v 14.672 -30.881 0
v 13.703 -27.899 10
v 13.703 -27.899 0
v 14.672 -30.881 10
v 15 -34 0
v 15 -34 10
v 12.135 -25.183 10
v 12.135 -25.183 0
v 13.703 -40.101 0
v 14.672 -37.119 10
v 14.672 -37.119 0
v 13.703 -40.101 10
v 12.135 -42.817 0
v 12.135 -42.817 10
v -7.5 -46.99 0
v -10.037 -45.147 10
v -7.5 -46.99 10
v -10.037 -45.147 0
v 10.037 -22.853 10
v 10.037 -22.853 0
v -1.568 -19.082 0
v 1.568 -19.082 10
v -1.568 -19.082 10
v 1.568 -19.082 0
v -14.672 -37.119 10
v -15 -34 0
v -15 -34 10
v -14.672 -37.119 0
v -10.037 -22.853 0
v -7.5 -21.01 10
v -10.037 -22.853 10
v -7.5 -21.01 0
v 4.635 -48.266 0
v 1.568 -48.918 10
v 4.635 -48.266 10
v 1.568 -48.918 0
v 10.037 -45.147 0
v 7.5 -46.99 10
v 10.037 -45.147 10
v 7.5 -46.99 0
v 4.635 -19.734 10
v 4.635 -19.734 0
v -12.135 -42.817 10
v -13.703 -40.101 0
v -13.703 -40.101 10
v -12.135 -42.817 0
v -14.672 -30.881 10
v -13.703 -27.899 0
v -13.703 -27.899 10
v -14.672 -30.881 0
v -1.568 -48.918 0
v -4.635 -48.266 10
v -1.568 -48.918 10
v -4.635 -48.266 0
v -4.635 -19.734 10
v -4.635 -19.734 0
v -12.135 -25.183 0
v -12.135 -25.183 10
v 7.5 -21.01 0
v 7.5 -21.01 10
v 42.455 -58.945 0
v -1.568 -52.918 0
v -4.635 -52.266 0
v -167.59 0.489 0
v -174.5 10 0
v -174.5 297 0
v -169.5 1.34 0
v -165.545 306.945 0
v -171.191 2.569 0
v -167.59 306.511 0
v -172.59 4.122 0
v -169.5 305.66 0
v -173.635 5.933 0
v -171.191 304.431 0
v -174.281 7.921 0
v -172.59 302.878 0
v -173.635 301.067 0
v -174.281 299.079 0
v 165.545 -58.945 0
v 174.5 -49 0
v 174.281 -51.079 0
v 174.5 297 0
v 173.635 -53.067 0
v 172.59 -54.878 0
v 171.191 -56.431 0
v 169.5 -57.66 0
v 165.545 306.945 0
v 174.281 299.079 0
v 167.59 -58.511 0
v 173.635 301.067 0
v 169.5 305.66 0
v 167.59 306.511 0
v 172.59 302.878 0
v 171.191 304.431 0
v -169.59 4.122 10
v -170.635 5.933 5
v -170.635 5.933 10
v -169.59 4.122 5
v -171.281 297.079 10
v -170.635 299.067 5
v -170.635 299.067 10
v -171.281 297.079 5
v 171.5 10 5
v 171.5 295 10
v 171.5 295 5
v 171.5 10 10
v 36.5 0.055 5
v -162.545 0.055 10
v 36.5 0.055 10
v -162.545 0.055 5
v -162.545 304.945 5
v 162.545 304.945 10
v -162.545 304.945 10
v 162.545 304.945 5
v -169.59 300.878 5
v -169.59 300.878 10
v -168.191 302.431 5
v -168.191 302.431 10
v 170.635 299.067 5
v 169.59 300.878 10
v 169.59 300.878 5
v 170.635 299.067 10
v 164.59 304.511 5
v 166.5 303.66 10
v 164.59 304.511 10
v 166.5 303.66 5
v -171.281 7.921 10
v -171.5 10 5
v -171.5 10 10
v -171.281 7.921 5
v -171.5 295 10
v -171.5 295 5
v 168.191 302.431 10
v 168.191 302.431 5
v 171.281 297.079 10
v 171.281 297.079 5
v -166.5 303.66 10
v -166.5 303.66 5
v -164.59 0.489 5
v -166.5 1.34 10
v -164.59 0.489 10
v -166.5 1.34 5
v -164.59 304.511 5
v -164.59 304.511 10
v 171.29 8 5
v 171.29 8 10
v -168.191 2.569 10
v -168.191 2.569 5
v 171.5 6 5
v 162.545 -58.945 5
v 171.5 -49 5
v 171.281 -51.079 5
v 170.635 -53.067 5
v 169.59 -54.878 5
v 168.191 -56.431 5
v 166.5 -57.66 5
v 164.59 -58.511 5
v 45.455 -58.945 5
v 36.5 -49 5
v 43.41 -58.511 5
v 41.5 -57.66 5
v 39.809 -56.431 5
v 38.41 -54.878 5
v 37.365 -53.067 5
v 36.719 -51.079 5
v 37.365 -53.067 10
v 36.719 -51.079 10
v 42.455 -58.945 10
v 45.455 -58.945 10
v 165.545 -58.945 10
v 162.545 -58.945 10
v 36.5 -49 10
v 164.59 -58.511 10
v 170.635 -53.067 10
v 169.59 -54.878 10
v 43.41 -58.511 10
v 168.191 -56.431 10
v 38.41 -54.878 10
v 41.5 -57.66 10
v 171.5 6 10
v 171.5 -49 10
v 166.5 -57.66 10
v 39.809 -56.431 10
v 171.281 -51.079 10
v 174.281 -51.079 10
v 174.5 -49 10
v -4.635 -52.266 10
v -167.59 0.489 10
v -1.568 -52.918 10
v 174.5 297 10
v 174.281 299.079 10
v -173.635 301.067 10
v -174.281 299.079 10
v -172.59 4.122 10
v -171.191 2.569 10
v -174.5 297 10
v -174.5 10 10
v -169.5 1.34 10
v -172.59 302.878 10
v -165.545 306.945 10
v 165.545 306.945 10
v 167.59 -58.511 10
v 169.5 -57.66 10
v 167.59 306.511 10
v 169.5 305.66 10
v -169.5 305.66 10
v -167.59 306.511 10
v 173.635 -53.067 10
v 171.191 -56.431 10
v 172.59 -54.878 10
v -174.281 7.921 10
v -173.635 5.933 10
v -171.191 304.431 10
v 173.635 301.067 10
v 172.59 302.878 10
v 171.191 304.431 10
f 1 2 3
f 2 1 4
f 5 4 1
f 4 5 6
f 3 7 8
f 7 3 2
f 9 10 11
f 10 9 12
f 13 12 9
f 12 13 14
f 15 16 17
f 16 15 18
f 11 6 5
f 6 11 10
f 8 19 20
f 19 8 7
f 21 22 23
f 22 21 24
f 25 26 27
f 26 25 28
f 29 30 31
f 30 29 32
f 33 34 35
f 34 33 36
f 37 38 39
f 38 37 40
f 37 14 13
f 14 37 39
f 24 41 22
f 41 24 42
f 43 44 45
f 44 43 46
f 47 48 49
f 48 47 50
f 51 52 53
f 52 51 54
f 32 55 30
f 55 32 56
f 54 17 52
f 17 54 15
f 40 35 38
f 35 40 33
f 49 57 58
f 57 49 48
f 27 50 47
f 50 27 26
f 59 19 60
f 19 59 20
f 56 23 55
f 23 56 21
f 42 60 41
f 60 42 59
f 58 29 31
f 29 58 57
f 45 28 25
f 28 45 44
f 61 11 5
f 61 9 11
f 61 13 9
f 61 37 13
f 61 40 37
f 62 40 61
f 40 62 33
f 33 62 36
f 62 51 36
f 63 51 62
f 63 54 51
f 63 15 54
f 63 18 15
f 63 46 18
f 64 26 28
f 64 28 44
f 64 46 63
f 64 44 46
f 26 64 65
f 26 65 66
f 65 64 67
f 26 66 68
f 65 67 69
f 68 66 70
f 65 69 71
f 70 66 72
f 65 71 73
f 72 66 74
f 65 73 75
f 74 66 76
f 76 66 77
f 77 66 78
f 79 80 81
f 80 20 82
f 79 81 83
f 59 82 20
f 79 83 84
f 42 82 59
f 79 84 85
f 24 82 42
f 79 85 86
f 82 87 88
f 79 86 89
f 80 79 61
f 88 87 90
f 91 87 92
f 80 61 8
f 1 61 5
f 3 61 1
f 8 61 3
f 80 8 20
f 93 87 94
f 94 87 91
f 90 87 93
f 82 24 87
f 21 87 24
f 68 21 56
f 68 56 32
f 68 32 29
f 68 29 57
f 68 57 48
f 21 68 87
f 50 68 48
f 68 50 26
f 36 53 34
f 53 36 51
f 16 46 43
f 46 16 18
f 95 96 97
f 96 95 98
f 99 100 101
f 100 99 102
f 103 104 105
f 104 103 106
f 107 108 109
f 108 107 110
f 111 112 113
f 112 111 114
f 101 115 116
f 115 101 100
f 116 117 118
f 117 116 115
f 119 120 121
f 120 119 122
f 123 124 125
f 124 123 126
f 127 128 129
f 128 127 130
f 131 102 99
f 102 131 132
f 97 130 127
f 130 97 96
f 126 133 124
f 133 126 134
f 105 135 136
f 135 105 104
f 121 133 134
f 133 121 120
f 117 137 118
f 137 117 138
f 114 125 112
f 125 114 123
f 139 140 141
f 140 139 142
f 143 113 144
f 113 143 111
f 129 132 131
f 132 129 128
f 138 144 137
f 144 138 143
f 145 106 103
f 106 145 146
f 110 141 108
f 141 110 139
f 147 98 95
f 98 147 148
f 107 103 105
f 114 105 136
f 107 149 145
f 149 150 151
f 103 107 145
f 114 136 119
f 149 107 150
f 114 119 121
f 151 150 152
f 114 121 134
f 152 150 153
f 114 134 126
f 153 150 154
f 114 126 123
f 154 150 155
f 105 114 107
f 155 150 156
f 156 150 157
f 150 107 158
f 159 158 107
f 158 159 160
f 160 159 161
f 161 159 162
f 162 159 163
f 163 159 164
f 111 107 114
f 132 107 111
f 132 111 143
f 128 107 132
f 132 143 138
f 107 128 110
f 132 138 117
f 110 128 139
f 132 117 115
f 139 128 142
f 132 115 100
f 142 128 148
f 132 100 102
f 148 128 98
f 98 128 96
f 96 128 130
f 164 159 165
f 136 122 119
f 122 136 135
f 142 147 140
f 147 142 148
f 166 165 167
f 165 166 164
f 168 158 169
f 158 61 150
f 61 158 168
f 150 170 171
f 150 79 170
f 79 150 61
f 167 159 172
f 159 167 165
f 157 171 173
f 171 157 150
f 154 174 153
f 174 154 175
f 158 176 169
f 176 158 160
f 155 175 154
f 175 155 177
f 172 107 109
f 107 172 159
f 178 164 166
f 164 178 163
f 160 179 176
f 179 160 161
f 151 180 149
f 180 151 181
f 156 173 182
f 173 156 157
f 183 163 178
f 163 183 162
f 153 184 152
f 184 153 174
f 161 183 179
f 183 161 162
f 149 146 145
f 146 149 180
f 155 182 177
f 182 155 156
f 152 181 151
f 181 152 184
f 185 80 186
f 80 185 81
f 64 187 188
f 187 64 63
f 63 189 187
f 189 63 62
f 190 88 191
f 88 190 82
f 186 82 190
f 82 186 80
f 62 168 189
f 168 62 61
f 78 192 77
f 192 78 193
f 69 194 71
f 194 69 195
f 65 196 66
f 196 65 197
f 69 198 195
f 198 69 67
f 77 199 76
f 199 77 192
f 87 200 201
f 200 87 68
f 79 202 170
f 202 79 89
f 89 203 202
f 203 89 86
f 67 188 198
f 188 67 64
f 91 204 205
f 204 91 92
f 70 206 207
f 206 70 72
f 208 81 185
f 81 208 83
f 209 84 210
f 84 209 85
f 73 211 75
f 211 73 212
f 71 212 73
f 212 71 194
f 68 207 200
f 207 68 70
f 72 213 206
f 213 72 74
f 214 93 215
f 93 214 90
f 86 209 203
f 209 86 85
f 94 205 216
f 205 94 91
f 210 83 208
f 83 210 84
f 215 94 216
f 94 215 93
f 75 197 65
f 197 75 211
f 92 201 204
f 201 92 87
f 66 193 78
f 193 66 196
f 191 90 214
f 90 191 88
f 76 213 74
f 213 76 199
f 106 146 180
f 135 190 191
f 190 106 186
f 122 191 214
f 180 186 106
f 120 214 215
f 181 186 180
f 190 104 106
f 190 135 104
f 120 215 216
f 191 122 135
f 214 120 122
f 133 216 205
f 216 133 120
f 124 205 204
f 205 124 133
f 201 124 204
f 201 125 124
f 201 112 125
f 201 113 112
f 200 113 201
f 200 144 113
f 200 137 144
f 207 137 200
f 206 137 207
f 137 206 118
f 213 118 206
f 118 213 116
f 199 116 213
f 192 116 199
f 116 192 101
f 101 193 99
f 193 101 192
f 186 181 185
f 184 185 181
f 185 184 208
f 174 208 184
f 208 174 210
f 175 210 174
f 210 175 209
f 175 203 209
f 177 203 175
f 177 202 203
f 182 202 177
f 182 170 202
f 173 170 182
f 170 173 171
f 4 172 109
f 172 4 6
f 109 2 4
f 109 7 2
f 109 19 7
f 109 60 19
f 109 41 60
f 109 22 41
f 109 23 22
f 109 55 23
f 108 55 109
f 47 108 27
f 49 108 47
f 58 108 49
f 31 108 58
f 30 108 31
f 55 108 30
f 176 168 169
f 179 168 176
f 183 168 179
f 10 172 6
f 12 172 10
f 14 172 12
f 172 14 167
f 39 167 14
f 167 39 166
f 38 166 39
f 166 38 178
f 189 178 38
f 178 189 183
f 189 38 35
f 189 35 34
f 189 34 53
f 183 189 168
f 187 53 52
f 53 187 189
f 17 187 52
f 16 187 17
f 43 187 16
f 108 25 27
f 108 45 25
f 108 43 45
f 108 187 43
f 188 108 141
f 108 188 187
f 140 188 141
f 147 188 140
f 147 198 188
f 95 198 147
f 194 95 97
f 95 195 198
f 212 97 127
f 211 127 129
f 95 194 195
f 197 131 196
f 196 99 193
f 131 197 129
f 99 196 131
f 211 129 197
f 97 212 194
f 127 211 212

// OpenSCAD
module hole(d, h) {
  cylinder(h=h, r = d/2);
}

module rounded_rectangle(width, height, depth, radius) {
  x = (width / 2) - radius;

  x_left = -x;
  x_right = x;

  y_top = radius;
  y_bottom = y_top + depth;

  linear_extrude(height=height)
    hull() {
    // place 4 circles in the corners, with the given radius
    translate([x_left, y_top, 0])
      circle(r=radius);
    translate([x_right, y_top, 0])
      circle(r=radius);
    translate([x_left, y_bottom, 0])
      circle(r=radius);
    translate([x_right, y_bottom, 0])
      circle(r=radius);
  }
}

module platform(width, height, depth) {
  radius = 10;

  difference() {
    rounded_rectangle(width + 6, height, depth + 3, radius);
    translate([0, 0, 2]) rounded_rectangle(width, height, depth, radius);
  }
}

module connector(width, height, depth) {
  radius = 10;

  difference() {
    rounded_rectangle(width + 6, height, depth, radius);
    translate([0, 0, 2]) rounded_rectangle(width, height, depth, radius);
  }
}

connector_depth = 35;
connector_width = 135;
connector_height = 10;

mount_diameter = 30;
mount_radius = mount_diameter / 2;

pad_height = 5;

platform_width = 343;
platform_height = pad_height*2;
platform_depth = 285;

radius = 10;

difference() {
  hull() {
    translate([0,-mount_diameter-8,0]) hole(mount_diameter, platform_height);
    rounded_rectangle(platform_width + 6, platform_height, platform_depth + 2, radius);
    translate([((platform_width - connector_width)/2),-connector_depth-24, 0]) rounded_rectangle(connector_width + 6, connector_height, connector_depth, radius);
  }
  union() {
    translate([0,-mount_diameter-4,0]) hole(mount_diameter, platform_height+10);
    translate([0, 0, platform_height/2]) rounded_rectangle(platform_width, platform_height, platform_depth, radius);
    translate([((platform_width - connector_width)/2),-connector_depth-24, platform_height/2]) rounded_rectangle(connector_width, connector_height, connector_depth+20, radius);
  }
}
